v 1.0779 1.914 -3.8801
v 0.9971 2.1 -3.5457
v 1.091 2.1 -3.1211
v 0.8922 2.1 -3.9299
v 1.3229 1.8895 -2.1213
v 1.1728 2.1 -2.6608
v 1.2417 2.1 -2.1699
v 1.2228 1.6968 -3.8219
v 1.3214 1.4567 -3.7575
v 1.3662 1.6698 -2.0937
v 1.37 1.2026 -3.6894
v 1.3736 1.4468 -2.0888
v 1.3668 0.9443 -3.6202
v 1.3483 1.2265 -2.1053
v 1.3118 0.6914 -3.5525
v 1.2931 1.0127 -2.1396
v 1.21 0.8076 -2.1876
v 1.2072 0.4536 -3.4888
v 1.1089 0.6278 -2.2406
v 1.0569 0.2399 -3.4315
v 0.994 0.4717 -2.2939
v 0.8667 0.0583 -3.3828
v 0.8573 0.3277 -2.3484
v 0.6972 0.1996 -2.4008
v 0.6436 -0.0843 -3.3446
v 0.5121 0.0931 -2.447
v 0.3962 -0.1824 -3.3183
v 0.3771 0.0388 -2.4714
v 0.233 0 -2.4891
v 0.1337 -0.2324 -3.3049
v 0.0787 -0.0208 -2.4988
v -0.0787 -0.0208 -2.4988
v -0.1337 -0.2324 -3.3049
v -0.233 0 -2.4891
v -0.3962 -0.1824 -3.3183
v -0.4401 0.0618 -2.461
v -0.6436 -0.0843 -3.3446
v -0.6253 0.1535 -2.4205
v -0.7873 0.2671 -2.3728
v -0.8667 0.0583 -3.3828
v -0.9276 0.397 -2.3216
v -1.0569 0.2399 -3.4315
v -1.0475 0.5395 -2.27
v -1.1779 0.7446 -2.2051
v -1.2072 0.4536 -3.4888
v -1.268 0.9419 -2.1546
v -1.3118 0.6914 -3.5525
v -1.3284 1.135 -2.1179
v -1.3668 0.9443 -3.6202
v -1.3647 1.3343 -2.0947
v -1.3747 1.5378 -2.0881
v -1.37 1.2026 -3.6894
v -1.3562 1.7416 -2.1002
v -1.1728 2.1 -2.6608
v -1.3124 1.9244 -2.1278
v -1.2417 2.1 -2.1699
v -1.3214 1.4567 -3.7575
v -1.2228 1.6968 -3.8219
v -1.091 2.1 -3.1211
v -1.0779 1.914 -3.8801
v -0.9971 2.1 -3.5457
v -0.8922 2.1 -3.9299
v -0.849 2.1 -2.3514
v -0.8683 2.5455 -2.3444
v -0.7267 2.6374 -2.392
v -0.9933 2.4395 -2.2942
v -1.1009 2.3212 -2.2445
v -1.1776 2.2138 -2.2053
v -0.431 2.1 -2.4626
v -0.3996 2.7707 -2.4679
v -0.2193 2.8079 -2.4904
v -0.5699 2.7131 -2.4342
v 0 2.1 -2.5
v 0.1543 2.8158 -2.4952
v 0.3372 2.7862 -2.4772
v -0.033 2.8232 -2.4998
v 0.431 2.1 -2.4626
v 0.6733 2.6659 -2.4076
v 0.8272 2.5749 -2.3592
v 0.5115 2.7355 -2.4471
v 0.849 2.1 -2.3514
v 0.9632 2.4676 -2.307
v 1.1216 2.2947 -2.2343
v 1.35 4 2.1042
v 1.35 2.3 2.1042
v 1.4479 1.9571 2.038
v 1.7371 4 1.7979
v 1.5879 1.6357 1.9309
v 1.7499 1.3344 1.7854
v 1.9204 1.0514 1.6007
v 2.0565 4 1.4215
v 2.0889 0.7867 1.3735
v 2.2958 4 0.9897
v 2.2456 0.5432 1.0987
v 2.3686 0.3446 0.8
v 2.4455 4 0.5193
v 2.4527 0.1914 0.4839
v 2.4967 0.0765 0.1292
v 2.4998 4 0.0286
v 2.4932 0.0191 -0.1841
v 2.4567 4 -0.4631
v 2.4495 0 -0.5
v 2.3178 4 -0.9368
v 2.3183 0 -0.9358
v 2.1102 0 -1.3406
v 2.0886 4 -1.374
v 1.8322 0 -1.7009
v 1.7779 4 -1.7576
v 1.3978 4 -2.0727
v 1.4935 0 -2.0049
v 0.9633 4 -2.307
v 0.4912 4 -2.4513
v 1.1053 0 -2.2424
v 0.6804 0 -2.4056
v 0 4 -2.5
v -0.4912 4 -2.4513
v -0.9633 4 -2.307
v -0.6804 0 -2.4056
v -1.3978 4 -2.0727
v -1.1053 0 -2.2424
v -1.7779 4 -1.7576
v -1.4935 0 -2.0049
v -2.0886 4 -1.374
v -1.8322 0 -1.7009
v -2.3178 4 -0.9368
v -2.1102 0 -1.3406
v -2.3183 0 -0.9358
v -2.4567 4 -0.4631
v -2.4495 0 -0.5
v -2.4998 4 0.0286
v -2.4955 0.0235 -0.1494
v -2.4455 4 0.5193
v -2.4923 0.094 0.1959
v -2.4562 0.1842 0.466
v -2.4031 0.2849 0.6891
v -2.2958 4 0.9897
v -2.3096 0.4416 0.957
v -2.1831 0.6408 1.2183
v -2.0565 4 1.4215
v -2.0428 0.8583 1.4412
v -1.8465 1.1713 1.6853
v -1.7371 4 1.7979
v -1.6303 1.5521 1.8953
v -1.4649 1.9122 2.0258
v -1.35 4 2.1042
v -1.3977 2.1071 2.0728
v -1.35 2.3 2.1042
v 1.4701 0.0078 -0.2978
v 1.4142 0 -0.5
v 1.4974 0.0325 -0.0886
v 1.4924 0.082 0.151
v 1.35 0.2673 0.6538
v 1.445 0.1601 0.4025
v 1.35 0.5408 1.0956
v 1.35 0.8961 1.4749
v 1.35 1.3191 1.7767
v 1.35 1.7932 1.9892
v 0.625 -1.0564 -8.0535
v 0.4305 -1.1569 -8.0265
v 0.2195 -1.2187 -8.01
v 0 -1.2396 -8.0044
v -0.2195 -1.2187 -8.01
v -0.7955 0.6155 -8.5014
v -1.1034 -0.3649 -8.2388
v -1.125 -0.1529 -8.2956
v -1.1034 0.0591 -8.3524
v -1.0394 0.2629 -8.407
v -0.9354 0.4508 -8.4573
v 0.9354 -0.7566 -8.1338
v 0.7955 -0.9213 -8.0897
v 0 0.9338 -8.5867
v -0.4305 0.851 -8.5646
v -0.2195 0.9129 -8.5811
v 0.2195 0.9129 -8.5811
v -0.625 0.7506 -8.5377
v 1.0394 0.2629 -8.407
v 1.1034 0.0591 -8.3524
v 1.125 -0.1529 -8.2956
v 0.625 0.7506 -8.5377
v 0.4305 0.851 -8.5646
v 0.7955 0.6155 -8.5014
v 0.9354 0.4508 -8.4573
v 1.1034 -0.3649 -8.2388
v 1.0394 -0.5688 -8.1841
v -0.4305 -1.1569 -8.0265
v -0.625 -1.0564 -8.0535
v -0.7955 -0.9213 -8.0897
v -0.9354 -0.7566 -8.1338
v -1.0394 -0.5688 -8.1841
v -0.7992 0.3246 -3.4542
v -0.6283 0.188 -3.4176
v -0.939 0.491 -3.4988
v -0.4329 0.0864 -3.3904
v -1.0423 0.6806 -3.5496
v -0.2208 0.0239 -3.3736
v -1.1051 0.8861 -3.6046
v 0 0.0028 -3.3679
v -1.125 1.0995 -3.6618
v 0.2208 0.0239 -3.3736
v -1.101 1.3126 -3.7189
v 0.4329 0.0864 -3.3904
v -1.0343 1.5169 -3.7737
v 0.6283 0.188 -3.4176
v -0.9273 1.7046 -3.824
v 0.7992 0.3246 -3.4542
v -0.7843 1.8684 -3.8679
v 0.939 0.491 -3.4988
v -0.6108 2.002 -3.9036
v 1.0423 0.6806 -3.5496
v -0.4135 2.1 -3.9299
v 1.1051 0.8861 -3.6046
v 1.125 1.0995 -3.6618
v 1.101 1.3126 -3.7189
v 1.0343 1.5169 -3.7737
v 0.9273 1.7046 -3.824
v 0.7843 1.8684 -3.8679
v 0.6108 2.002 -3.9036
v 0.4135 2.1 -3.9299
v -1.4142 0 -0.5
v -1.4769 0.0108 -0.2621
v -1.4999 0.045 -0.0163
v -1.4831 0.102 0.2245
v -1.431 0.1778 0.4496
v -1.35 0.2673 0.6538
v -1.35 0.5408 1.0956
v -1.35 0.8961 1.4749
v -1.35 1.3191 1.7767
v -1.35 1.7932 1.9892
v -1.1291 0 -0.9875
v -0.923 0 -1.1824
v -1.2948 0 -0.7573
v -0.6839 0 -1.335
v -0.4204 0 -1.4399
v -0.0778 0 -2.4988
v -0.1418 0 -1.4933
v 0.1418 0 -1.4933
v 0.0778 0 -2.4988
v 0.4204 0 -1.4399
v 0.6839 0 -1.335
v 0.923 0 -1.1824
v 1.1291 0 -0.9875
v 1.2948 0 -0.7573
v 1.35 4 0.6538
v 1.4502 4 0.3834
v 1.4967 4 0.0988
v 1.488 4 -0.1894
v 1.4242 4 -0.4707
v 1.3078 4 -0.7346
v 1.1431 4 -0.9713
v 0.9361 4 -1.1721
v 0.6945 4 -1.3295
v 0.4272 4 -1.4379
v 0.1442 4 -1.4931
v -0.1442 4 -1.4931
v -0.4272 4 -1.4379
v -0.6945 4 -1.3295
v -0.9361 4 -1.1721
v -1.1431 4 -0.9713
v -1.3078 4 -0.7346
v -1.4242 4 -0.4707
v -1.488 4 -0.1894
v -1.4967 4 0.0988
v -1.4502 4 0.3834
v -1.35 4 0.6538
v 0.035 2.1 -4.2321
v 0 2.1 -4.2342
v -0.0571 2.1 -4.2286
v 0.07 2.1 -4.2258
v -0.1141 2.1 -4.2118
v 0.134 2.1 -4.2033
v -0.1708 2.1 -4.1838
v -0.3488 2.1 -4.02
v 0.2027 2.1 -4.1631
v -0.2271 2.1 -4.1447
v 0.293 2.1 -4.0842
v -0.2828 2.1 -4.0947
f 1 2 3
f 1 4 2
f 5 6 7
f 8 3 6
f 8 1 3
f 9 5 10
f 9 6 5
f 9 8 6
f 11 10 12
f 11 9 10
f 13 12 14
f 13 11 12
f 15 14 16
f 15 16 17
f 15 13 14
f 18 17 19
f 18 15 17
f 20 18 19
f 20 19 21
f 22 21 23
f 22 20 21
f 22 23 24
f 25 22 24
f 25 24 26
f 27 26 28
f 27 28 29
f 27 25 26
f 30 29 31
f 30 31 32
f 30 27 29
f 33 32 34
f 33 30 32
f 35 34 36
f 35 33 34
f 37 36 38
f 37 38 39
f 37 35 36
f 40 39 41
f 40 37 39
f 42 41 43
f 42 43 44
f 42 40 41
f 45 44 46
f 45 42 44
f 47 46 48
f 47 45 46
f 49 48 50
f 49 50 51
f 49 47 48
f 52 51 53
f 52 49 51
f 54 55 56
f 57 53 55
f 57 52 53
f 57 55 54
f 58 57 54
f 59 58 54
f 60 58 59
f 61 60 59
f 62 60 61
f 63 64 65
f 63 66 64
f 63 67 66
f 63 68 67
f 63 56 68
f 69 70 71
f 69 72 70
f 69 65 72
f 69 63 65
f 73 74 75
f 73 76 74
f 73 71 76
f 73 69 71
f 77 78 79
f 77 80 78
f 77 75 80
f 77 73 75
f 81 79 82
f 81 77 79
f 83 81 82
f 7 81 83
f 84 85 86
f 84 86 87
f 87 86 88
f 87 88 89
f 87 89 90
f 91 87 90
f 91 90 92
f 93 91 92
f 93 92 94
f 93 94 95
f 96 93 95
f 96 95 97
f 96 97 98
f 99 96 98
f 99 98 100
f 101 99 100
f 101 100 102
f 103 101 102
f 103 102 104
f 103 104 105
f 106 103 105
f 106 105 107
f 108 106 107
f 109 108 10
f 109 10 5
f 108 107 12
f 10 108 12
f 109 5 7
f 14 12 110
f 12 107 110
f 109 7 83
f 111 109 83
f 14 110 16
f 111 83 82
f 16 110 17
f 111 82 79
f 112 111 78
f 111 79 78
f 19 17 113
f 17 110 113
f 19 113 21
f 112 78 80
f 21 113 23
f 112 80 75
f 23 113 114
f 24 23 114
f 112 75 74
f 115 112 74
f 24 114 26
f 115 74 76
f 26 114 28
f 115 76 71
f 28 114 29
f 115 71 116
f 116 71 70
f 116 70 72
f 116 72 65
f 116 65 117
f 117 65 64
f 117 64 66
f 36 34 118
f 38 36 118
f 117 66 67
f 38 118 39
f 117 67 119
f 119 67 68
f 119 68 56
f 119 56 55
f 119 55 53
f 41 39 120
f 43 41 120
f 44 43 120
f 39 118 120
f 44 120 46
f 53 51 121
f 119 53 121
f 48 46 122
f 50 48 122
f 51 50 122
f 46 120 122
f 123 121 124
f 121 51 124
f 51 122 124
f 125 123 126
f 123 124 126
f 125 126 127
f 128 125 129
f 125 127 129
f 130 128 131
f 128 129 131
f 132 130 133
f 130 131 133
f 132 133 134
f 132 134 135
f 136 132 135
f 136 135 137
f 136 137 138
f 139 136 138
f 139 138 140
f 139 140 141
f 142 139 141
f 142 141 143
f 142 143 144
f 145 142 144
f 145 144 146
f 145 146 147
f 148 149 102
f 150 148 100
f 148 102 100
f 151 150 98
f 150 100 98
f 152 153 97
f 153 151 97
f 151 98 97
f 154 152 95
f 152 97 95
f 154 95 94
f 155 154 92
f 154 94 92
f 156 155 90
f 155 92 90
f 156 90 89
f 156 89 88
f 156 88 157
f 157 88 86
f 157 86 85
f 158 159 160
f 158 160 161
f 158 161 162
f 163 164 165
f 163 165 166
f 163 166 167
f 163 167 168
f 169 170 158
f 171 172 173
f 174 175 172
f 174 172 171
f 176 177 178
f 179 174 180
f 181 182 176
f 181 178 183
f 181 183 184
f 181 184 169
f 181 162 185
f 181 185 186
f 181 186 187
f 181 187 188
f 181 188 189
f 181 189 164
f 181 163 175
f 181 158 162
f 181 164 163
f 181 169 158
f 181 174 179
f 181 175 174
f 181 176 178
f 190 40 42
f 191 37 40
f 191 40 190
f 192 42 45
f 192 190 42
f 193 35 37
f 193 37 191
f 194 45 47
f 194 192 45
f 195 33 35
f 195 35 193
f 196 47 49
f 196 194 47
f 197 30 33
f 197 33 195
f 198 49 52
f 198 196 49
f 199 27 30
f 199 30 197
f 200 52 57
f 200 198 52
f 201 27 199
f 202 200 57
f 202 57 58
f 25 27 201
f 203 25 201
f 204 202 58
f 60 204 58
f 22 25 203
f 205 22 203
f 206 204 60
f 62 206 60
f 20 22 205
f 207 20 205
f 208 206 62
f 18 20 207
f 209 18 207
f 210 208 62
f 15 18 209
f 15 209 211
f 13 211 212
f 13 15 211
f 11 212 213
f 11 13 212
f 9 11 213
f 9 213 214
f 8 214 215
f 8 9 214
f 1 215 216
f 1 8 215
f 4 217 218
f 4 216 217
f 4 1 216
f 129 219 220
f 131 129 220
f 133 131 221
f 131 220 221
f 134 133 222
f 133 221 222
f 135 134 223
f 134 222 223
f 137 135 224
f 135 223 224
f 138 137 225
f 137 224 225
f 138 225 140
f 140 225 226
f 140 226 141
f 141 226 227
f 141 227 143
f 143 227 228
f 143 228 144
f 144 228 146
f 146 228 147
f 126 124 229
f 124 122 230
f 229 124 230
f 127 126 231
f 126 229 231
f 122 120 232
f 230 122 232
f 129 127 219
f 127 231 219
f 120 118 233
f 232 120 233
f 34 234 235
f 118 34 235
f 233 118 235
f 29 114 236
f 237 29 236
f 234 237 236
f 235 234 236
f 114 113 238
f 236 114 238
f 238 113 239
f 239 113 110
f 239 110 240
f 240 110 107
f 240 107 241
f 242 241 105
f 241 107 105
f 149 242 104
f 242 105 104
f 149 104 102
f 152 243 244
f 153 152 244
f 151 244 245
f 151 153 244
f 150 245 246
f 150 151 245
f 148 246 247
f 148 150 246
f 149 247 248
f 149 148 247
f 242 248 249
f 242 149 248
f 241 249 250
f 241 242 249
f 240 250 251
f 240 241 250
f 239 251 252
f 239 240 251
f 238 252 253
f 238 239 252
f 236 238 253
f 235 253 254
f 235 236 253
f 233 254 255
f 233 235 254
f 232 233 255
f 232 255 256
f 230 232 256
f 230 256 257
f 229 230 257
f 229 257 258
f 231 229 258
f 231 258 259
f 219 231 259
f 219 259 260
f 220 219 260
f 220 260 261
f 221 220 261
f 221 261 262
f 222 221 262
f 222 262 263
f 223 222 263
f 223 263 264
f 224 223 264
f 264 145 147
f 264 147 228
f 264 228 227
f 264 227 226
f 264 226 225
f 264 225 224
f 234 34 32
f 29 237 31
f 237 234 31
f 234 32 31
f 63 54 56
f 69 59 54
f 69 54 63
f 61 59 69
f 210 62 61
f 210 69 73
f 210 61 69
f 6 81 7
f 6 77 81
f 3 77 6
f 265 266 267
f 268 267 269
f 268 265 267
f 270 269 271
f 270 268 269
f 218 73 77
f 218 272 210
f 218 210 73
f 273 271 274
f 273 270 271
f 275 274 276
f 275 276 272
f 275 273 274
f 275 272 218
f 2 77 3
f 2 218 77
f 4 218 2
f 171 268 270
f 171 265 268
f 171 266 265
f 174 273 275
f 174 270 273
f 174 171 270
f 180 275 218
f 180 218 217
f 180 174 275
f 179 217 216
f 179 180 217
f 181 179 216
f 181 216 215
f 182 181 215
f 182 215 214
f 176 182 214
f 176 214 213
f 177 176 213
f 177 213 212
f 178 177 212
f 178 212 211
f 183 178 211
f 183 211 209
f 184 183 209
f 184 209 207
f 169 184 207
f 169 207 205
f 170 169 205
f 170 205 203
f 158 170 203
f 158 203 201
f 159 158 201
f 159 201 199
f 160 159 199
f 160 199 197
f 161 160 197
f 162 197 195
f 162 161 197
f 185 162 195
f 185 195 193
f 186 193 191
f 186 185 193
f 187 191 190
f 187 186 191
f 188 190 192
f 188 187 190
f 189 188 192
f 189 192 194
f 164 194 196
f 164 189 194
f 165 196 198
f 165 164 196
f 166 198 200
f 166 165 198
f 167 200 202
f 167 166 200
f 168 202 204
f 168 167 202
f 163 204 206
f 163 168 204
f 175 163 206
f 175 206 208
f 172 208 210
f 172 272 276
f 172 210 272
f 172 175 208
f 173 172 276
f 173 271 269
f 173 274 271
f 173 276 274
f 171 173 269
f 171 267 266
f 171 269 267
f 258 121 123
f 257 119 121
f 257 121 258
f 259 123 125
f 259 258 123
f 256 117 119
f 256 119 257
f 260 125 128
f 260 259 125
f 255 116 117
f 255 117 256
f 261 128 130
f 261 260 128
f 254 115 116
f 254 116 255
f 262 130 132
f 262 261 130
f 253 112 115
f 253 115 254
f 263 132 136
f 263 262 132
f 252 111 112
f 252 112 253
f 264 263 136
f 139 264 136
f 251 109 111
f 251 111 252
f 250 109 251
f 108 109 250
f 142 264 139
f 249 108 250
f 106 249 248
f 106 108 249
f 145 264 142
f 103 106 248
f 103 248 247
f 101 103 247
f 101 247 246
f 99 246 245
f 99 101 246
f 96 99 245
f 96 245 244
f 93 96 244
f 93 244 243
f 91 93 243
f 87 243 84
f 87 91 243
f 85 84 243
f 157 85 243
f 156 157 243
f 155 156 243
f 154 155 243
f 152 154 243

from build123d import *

# Parameters (mm, degrees)
SKETCH1_R                = 2.5
SKETCH1_R_2              = 1.5
BOSS_EXTRUDE1_DEPTH      = 4
SKETCH2_W                = 2.7
SKETCH2_H                = 3.154184917
CUT_EXTRUDE1_DEPTH       = 6.338539126
CUT_EXTRUDE2_DEPTH       = 9.860022573
BOSS_EXTRUDE2_REACH      = 13.474
BOSS_EXTRUDE2_END_RADIUS = 2.5
SKETCH5_R                = 1.125
BOSS_EXTRUDE3_REACH      = 18.274
BOSS_EXTRUDE3_END_RADIUS = 2.5
BOSS_EXTRUDE3_START      = -4.8
SKETCH6_R                = 1.375
CUT_EXTRUDE3_REACH       = 14.991
CUT_EXTRUDE3_END_RADIUS  = 2.5


with BuildPart() as part:
    # Sketch1 → Boss-Extrude1 (new body)
    with BuildSketch(Plane(origin=(0, 0, 0), x_dir=(1, 0, 0), z_dir=(0, 1, 0))):
        with Locations(Location((0, 0, 0), (0, 0, 270))):
            Circle(SKETCH1_R)
        with Locations(Location((0, 0, 0), (0, 0, 270))):
            Circle(SKETCH1_R_2, mode=Mode.SUBTRACT)
    extrude(amount=BOSS_EXTRUDE1_DEPTH)

    # Sketch2 → Cut-Extrude1 (cut, through all)
    with BuildSketch(Plane(origin=(0, 4, 0), x_dir=(1, 0, 0), z_dir=(0, 1, 0))):
        with Locations((0, -1.577092459)):
            Rectangle(SKETCH2_W, SKETCH2_H)
    extrude(amount=-CUT_EXTRUDE1_DEPTH, mode=Mode.SUBTRACT)

    # Sketch3 → Cut-Extrude2 (cut, through all)
    with BuildSketch(Plane(origin=(5, 0, 0), x_dir=(0, 0, -1), z_dir=(1, 0, 0))):
        with BuildLine():
            Line((-2.104162541, 2.3), (-2.104162541, 0))
            Line((-2.104162541, 0), (0.5, 0))
            ThreePointArc((0.5, 0), (-1.237214908, 0.657322297), (-2.104162541, 2.3))
        make_face()
    extrude(amount=-CUT_EXTRUDE2_DEPTH, mode=Mode.SUBTRACT)

    # Boss-Extrude2: up to this cylinder (the profile starts outside it)
    boss_extrude2_end = Plane(origin=(0, -0.152914, 0), z_dir=(0, -1, 0)) * Cylinder(BOSS_EXTRUDE2_END_RADIUS, 32.948, mode=Mode.PRIVATE)
    # Sketch5 → Boss-Extrude2 (add, up to the surface)
    with BuildSketch(Plane(origin=(0, -0.152914271, -8.295554958), x_dir=(-1, 0, 0), z_dir=(0, -0.2588190451025248, -0.9659258262890673)), mode=Mode.PRIVATE) as boss_extrude2_sk1:
        with Locations(Location((0, 0, 0), (0, 0, 90))):
            Circle(SKETCH5_R)
    boss_extrude2_tool1 = extrude(boss_extrude2_sk1.sketch, amount=-BOSS_EXTRUDE2_REACH, mode=Mode.PRIVATE) - boss_extrude2_end
    add(boss_extrude2_tool1.solids().sort_by_distance((0, -0.152914, -8.295555))[0])

    # Boss-Extrude3: up to this cylinder (the profile starts outside it)
    boss_extrude3_end = Plane(origin=(0, 1.089417, 0), z_dir=(0, -1, 0)) * Cylinder(BOSS_EXTRUDE3_END_RADIUS, 42.548, mode=Mode.PRIVATE)
    # Sketch6 → Boss-Extrude3 (add, up to the surface)
    with BuildSketch(Plane(origin=(0, -0.152914271, -8.295554958), x_dir=(-1, 0, 0), z_dir=(0, -0.2588190451025248, -0.9659258262890673)).offset(BOSS_EXTRUDE3_START), mode=Mode.PRIVATE) as boss_extrude3_sk1:
        with Locations(Location((0, 0, 0), (0, 0, 90))):
            Circle(SKETCH6_R)
    boss_extrude3_tool1 = extrude(boss_extrude3_sk1.sketch, amount=-BOSS_EXTRUDE3_REACH, mode=Mode.PRIVATE) - boss_extrude3_end
    add(boss_extrude3_tool1.solids().sort_by_distance((0, 1.089417, -3.659111))[0])

    # Cut-Extrude3: up to this cylinder (the profile starts outside it)
    cut_extrude3_end = Plane(origin=(0, 3.059919, 0), z_dir=(0, -1, 0)) * Cylinder(CUT_EXTRUDE3_END_RADIUS, 35.982, mode=Mode.PRIVATE)
    # Sketch7 → Cut-Extrude3 (cut, up to the surface)
    with BuildSketch(Plane.XY.offset(-10), mode=Mode.PRIVATE) as cut_extrude3_sk1:
        Polygon((0, 4.019838564), (-2.13014509, 4.019838564), (-2.13014509, 2.1), (2.0800272, 2.1), (2.0800272, 4.019838564), align=None)
    cut_extrude3_tool1 = extrude(cut_extrude3_sk1.sketch, amount=CUT_EXTRUDE3_REACH, mode=Mode.PRIVATE) - cut_extrude3_end
    add(cut_extrude3_tool1.solids().sort_by_distance((-0.025059, 3.059919, -10))[0], mode=Mode.SUBTRACT)


solid = part.part
